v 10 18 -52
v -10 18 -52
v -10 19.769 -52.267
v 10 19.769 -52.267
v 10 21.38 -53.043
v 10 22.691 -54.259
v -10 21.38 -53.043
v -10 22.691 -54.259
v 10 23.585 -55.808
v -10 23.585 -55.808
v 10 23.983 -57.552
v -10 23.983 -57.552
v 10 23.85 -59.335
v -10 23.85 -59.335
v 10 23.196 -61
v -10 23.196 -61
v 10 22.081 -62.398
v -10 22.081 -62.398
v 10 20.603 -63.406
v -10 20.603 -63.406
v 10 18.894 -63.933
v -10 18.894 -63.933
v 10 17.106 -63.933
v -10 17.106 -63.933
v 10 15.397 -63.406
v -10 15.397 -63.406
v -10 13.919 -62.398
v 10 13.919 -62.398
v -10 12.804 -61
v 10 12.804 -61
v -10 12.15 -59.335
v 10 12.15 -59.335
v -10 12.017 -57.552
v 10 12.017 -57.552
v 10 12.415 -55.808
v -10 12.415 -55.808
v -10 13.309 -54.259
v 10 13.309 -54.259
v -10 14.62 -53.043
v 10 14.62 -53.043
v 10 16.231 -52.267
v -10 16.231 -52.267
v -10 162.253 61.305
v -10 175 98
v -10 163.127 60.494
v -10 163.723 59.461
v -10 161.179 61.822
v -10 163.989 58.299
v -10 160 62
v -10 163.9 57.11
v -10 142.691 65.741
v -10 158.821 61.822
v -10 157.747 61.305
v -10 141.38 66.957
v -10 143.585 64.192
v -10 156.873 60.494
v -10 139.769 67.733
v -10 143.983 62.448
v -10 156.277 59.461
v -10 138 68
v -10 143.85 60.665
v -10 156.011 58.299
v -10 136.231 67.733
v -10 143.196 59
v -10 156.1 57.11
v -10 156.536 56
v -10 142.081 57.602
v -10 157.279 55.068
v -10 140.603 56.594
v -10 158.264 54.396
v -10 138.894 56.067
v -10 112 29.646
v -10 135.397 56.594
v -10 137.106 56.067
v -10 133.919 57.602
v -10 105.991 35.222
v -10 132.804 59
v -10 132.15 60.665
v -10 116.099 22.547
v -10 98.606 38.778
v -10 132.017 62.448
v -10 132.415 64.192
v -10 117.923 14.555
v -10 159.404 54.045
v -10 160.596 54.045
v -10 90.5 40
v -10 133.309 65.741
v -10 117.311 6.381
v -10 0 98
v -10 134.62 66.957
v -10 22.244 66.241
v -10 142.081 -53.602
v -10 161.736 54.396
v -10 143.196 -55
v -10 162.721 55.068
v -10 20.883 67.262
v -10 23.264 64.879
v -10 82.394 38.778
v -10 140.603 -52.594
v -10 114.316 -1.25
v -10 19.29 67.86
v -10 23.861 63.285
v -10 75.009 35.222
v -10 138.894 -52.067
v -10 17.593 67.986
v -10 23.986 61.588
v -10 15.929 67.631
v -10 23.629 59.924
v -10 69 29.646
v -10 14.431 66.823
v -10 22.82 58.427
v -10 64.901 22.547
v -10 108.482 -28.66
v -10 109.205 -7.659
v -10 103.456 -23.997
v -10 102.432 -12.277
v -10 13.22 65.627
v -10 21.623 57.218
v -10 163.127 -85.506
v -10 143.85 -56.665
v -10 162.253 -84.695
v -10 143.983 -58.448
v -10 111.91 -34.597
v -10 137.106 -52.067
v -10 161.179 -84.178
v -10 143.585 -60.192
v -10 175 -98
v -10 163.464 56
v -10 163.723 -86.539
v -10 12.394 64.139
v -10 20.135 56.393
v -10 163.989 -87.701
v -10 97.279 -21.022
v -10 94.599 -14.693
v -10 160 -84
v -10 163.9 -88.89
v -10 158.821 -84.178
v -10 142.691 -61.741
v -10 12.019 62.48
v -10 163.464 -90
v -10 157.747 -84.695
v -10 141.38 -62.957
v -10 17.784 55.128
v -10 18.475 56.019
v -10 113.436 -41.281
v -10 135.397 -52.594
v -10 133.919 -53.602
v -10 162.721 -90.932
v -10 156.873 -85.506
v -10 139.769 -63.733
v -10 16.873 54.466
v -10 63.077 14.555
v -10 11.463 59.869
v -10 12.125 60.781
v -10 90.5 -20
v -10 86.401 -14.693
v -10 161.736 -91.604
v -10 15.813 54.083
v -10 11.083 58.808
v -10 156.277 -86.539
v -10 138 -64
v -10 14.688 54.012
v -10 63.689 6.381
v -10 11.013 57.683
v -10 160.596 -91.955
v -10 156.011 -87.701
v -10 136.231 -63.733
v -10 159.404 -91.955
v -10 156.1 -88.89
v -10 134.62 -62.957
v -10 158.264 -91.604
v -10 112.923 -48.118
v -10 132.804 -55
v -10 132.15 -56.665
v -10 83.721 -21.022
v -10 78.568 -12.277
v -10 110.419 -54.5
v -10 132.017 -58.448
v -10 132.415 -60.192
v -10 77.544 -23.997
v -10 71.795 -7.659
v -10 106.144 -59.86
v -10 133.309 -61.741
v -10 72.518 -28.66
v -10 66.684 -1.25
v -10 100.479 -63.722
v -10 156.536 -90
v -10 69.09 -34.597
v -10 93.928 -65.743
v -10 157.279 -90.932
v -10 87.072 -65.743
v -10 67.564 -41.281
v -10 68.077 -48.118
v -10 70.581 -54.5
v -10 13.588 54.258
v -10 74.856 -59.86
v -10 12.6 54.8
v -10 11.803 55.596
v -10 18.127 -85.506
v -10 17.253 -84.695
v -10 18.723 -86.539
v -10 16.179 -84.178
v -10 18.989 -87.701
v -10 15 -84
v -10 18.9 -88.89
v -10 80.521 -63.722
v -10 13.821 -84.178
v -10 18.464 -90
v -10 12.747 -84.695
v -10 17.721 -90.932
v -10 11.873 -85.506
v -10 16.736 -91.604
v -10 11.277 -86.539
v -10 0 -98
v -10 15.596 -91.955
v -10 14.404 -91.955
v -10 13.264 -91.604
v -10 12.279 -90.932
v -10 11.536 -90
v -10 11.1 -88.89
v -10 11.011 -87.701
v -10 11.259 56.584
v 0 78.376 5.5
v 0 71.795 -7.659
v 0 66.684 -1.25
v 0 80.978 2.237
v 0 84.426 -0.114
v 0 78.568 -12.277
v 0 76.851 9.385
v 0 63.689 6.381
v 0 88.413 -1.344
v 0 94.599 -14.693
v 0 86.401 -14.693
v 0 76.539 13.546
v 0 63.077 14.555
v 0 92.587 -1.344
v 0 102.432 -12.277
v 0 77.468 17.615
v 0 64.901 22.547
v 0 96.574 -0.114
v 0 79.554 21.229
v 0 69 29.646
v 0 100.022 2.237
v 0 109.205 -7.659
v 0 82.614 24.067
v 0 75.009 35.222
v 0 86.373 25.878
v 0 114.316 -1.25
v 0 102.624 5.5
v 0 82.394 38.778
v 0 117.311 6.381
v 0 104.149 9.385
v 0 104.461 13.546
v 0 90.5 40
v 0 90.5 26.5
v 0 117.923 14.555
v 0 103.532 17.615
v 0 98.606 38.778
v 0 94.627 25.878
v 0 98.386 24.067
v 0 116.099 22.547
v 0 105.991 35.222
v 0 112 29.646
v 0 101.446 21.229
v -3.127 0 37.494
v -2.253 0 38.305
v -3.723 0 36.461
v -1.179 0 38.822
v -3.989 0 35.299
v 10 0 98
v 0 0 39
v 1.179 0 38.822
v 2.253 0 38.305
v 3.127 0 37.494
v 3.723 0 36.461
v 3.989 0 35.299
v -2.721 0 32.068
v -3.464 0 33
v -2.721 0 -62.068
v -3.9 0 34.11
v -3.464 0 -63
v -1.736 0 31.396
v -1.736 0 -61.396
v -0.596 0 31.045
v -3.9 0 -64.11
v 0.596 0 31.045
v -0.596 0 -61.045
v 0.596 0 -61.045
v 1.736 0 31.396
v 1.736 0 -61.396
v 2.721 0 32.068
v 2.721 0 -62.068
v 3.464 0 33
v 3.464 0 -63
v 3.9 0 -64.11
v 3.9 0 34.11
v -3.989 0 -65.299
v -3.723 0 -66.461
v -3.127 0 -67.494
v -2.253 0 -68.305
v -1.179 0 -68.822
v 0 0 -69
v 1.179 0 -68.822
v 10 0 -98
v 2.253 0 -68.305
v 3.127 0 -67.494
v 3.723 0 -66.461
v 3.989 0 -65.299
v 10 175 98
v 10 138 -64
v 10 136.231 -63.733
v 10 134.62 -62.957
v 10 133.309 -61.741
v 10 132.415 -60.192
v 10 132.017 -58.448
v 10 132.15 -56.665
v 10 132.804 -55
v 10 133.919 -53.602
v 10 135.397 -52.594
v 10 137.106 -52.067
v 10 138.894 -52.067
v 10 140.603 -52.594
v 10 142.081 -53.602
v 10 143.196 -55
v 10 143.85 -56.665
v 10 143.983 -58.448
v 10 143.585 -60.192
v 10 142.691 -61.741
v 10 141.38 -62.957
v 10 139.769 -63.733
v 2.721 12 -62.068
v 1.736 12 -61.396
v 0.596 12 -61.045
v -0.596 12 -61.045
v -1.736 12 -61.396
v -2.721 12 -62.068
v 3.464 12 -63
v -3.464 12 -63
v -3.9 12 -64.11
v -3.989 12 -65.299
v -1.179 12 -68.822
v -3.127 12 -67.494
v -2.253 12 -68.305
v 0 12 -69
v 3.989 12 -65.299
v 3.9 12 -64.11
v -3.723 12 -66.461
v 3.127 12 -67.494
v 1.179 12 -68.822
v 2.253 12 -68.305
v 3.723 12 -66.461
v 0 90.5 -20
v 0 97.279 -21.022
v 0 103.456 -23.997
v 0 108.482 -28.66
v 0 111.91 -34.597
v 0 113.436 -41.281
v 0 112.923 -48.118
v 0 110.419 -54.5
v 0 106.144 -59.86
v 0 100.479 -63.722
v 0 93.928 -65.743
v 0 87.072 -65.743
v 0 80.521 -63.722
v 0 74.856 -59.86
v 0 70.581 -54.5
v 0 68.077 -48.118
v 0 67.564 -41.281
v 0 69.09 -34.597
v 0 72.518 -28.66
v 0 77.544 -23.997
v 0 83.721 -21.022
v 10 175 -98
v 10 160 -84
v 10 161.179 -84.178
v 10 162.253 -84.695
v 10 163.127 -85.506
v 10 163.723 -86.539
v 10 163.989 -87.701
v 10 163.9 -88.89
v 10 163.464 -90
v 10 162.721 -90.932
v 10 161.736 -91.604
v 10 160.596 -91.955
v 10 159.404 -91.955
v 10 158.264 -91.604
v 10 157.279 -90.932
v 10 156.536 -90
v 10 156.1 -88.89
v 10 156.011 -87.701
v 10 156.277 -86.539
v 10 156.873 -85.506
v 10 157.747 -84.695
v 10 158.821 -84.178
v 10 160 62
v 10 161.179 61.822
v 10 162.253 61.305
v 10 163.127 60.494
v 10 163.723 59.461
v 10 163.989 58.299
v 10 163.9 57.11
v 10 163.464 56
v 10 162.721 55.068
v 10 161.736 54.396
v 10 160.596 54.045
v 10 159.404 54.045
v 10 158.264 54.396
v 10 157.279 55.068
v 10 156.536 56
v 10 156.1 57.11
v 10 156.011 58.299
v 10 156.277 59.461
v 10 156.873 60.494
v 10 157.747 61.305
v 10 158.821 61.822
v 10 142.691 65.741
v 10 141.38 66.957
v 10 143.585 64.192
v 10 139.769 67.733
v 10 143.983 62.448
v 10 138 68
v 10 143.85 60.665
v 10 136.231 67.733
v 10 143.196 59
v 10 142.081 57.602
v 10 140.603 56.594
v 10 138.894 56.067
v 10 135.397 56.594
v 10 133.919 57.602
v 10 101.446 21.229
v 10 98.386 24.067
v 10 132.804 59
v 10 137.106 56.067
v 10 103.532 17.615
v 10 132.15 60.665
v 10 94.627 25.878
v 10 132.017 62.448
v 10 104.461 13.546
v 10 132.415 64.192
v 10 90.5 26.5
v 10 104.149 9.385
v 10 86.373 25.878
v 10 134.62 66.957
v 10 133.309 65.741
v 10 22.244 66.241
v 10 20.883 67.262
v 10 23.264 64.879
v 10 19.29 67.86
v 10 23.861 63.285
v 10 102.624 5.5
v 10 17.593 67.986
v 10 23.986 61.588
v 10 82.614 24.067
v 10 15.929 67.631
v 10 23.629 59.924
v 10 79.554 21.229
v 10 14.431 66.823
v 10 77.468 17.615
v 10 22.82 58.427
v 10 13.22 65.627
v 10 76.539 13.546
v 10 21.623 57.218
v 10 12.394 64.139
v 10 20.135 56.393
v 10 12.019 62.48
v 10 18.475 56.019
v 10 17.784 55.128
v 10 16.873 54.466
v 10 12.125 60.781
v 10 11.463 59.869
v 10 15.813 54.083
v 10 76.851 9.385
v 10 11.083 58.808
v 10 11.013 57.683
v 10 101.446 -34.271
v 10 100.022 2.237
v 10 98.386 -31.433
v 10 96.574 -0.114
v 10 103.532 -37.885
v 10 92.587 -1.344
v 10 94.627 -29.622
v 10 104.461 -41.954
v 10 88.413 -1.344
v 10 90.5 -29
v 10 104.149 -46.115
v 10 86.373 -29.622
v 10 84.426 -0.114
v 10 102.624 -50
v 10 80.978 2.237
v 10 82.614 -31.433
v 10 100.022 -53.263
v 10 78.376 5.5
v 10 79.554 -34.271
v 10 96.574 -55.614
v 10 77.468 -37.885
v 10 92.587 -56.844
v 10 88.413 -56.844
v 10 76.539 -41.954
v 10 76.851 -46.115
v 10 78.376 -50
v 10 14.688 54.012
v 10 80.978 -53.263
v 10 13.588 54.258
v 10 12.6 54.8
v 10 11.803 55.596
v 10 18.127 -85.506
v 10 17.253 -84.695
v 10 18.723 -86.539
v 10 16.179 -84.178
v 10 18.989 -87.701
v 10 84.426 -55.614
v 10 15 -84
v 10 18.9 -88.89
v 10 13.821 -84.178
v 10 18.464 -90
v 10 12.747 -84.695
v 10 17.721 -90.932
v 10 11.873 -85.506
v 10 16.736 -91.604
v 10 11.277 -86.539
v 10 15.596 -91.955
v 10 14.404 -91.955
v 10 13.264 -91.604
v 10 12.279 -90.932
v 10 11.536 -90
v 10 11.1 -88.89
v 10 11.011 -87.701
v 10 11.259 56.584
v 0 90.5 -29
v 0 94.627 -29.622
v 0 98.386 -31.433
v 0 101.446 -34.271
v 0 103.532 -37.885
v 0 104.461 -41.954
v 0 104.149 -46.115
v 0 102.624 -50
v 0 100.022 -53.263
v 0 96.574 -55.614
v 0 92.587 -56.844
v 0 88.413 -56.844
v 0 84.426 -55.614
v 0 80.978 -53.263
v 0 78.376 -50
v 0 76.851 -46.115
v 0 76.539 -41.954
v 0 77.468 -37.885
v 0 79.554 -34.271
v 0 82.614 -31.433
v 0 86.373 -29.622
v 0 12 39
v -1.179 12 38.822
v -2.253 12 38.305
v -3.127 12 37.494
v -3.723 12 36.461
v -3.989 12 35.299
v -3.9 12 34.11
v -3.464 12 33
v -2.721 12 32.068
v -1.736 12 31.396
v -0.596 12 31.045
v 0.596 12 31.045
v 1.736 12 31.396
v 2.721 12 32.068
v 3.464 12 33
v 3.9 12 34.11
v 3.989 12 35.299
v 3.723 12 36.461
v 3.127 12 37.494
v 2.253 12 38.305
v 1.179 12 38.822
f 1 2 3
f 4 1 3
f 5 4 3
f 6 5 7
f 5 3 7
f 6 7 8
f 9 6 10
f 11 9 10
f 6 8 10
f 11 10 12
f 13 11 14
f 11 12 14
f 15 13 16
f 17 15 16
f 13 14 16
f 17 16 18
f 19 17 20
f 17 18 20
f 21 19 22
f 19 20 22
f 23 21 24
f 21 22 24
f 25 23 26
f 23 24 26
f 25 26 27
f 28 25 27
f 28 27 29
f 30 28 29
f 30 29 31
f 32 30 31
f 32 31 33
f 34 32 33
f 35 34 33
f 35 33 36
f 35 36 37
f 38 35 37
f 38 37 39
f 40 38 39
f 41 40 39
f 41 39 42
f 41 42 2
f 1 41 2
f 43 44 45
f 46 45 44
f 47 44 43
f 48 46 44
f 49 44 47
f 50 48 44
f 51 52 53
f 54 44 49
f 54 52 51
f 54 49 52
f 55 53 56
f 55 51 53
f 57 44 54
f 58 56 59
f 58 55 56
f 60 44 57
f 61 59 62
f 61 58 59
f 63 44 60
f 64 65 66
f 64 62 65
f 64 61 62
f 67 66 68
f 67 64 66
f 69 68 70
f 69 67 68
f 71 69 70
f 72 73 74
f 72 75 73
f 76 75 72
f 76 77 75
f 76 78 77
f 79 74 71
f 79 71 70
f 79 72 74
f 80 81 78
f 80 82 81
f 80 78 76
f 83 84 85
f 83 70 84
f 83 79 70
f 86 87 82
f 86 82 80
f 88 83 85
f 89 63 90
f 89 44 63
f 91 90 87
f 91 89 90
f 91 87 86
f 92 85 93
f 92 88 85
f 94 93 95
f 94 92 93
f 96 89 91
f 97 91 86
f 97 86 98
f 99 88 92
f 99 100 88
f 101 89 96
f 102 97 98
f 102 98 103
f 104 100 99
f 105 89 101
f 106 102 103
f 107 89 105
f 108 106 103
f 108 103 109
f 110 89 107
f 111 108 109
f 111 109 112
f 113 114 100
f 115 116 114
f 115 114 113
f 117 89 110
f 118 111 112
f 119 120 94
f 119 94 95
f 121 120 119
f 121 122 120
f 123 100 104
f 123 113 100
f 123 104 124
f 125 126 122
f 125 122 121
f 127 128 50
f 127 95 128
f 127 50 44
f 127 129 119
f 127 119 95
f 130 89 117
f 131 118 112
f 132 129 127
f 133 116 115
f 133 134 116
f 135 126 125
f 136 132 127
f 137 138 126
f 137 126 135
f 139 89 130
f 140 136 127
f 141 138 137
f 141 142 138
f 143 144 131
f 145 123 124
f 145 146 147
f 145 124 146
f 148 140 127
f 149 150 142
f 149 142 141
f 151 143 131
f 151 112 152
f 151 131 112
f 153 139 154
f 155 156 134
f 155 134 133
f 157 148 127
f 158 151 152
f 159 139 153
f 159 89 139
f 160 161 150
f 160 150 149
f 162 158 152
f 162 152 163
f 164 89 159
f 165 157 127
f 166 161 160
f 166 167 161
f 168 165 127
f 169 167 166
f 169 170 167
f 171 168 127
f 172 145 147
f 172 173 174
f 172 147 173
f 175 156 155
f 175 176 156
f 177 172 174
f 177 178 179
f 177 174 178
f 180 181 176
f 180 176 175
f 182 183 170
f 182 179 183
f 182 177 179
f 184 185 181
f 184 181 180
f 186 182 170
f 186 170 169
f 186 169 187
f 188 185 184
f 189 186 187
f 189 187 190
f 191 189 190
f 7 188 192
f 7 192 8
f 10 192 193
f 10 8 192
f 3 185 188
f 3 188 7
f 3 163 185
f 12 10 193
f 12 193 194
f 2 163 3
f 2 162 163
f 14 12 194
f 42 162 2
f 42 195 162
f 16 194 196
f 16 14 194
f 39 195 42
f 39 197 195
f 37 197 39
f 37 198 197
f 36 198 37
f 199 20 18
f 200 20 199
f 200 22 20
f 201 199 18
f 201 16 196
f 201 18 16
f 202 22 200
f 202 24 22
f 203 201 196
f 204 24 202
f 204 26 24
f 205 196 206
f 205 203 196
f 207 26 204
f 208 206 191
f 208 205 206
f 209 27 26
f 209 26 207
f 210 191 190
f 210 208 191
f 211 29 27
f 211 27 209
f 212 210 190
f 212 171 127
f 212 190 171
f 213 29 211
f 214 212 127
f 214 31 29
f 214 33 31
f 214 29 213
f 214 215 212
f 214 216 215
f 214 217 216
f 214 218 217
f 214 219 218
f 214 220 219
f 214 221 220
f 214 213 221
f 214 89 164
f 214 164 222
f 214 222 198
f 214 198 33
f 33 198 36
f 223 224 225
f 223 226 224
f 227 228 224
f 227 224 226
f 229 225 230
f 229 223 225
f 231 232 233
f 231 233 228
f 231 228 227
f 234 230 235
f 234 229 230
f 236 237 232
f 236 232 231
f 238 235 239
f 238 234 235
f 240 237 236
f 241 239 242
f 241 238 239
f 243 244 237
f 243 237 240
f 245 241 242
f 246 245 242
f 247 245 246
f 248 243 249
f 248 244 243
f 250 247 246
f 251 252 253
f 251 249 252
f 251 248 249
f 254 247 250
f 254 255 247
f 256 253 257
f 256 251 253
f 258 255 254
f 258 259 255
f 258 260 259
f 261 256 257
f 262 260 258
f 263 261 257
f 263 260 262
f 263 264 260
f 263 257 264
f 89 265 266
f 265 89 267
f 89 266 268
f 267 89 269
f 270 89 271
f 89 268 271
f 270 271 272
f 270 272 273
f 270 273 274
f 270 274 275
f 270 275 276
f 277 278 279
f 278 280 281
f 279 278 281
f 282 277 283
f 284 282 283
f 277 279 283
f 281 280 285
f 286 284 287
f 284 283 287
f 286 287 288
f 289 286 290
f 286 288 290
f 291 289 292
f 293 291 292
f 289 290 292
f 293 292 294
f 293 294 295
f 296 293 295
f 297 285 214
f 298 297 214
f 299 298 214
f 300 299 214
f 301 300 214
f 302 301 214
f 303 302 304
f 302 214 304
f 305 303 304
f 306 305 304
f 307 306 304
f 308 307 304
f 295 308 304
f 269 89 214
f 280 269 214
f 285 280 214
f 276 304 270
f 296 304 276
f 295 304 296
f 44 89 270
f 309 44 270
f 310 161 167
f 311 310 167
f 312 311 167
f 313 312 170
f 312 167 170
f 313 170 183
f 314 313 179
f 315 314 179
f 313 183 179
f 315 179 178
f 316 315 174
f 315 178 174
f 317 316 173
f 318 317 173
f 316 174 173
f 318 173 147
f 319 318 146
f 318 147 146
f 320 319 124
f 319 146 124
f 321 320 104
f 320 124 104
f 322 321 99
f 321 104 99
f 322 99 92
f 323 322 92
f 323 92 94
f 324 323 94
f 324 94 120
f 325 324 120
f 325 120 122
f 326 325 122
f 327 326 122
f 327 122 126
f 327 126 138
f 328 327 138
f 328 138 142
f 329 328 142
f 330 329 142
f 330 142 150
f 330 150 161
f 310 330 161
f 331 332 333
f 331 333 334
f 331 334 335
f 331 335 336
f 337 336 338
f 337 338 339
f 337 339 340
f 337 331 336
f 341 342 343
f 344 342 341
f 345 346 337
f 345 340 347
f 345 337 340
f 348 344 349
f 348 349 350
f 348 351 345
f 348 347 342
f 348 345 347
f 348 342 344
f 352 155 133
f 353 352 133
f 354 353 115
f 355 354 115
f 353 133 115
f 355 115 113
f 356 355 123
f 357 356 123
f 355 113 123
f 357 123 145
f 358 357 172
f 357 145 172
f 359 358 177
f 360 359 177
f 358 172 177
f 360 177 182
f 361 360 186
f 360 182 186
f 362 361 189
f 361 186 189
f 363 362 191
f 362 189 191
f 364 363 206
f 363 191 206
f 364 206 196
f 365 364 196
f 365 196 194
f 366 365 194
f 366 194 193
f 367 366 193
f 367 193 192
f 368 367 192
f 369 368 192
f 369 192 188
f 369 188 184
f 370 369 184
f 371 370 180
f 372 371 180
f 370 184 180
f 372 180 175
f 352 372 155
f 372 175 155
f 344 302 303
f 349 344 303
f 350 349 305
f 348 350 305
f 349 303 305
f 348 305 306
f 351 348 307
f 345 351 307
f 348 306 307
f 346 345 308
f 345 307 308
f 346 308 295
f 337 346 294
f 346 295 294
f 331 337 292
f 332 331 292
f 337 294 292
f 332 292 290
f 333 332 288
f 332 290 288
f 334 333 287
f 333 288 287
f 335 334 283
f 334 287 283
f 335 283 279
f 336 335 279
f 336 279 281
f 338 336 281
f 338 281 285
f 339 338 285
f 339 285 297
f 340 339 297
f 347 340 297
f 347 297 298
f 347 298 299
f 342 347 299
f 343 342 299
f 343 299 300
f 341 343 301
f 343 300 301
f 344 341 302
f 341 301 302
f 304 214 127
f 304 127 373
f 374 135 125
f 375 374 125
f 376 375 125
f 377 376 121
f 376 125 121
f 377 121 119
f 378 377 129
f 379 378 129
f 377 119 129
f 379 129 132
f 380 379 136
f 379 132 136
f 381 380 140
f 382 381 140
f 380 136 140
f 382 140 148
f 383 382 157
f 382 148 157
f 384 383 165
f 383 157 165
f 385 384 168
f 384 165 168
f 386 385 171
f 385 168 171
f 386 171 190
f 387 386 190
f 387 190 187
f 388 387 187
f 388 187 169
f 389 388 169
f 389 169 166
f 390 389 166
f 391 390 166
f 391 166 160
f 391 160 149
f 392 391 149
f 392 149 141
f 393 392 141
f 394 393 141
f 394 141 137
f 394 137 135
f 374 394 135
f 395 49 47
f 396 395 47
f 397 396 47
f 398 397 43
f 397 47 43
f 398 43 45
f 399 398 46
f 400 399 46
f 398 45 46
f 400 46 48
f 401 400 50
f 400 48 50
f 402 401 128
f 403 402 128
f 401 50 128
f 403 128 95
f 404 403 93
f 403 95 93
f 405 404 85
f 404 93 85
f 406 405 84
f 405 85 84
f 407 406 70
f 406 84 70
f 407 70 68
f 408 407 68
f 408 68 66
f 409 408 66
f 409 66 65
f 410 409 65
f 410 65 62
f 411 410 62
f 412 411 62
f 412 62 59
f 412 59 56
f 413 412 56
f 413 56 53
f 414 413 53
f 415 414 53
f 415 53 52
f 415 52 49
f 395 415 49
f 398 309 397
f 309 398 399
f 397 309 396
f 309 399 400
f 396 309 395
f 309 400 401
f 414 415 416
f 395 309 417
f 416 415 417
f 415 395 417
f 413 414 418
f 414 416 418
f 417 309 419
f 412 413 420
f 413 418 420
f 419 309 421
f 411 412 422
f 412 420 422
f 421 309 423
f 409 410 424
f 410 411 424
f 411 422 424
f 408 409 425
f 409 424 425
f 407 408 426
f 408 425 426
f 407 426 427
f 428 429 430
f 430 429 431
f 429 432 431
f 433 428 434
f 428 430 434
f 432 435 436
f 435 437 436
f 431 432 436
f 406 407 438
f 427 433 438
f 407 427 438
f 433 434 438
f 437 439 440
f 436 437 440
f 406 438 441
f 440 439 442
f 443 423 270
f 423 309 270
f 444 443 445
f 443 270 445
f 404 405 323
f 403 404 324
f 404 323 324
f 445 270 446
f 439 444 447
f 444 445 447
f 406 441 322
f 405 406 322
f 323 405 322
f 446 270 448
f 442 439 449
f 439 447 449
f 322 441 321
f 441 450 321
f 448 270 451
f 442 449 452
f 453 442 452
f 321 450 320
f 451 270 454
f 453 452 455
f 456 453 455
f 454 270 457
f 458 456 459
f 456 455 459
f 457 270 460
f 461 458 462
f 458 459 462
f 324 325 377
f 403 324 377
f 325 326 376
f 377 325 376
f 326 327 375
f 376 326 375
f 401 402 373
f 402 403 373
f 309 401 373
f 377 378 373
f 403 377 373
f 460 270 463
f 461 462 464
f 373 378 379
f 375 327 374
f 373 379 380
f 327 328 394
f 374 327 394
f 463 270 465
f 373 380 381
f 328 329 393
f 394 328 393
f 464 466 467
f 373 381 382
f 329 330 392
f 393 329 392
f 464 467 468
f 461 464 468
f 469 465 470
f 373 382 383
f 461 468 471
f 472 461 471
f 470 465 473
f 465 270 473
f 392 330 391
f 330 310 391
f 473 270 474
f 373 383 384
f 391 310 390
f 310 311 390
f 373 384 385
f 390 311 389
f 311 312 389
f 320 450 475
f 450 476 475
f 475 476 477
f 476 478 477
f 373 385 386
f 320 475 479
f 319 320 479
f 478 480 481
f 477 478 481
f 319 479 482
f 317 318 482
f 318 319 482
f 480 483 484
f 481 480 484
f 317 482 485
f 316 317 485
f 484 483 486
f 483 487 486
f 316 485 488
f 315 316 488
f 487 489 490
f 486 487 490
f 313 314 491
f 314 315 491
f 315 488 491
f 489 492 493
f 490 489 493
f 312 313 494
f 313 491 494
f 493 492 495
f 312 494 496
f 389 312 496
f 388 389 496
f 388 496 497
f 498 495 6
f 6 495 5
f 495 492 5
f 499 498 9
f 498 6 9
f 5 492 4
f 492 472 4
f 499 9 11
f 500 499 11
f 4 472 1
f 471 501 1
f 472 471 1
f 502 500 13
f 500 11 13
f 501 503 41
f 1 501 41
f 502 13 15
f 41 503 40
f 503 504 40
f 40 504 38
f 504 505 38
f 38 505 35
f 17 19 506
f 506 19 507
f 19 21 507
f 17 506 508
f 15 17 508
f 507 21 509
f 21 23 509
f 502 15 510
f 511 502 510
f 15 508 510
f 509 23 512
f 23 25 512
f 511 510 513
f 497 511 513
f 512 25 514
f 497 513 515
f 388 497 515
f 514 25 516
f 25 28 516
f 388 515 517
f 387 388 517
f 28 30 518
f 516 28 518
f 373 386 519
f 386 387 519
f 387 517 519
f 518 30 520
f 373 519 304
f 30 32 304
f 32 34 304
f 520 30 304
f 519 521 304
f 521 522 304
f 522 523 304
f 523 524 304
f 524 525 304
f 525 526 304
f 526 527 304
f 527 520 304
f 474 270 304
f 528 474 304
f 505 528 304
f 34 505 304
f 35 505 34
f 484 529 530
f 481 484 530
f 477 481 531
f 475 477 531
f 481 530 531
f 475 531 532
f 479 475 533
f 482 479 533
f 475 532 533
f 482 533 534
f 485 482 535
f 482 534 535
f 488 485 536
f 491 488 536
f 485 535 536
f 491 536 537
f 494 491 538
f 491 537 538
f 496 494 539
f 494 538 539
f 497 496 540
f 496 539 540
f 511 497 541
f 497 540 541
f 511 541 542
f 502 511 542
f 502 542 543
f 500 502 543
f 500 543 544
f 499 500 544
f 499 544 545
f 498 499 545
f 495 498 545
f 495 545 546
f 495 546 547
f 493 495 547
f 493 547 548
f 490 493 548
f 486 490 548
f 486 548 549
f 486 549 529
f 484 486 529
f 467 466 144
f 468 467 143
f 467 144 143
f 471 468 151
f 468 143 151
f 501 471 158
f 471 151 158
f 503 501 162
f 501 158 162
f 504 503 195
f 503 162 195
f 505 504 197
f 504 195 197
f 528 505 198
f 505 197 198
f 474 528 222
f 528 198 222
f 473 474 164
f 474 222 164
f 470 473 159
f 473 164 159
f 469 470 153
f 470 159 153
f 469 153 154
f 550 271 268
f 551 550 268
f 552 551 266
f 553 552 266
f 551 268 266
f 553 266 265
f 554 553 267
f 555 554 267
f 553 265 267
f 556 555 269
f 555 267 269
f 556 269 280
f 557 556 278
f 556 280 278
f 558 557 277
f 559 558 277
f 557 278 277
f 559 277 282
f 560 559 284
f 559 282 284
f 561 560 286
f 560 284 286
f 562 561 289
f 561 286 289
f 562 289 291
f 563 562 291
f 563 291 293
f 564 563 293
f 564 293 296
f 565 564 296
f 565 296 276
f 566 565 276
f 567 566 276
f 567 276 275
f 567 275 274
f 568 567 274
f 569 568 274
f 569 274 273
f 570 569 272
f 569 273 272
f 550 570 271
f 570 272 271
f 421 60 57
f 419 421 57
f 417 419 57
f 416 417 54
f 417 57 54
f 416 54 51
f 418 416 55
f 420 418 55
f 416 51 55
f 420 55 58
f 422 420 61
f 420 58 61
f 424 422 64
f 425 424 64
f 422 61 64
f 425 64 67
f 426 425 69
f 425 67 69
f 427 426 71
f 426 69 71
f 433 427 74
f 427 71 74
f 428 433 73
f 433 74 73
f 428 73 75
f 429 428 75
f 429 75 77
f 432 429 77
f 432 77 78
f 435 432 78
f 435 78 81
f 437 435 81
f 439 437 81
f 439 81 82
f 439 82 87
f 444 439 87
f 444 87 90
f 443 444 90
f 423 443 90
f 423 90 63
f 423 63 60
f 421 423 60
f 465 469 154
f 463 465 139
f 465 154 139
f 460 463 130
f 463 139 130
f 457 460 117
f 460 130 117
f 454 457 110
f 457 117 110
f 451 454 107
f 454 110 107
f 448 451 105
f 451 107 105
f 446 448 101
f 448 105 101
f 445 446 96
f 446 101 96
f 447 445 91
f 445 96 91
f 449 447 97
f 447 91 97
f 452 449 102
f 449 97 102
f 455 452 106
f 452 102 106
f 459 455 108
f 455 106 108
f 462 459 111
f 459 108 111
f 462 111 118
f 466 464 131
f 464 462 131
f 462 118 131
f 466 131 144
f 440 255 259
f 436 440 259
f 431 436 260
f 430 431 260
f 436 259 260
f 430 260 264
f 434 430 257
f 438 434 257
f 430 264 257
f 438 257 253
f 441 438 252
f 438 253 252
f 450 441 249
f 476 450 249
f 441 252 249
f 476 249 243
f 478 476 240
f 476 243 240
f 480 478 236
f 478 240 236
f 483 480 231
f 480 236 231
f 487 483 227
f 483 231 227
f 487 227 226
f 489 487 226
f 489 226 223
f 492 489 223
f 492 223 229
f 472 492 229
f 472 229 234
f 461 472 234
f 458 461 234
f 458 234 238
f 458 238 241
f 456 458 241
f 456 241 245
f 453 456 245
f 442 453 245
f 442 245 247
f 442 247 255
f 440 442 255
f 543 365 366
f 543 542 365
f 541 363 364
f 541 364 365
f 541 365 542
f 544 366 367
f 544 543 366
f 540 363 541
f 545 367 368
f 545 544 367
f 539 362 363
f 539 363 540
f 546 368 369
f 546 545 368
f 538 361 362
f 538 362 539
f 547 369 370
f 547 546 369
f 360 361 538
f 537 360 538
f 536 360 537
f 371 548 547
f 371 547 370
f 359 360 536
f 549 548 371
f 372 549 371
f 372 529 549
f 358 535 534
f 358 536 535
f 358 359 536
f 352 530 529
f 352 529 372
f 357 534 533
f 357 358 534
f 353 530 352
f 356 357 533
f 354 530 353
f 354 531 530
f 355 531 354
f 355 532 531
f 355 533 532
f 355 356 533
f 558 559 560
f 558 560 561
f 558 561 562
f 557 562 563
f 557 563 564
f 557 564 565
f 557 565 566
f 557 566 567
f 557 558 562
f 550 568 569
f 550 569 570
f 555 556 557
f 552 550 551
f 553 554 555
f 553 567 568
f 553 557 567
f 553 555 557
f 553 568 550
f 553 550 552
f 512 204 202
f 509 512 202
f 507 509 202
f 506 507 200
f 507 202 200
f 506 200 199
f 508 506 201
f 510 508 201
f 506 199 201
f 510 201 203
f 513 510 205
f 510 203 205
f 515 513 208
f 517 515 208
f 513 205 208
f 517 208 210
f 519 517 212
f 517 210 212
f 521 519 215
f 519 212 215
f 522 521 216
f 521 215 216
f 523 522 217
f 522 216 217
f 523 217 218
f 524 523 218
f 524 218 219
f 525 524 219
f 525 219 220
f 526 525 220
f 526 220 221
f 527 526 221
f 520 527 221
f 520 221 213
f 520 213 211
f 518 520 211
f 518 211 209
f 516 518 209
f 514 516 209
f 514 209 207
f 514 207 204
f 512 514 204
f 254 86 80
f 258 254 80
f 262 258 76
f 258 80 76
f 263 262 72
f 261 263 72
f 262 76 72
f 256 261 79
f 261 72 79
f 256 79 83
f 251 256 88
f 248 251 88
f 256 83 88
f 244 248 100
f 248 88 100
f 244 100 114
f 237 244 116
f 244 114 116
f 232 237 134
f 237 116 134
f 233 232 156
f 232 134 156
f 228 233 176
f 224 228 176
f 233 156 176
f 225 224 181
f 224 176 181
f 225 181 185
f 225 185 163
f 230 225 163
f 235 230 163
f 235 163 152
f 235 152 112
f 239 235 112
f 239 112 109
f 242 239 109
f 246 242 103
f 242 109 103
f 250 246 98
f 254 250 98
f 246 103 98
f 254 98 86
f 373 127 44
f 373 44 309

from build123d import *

# Parameters (mm, degrees)
SKETCH1_W           = 20
SKETCH1_H           = 196
BOSS_EXTRUDE1_DEPTH = 175
SKETCH2_R           = 27.5
SKETCH2_R_2         = 23
CUT_EXTRUDE1_DEPTH  = 10
SKETCH3_R           = 14
CUT_EXTRUDE2_DEPTH  = 201.820815654
SKETCH4_R           = 4
CUT_EXTRUDE3_DEPTH  = 202.566366242
SKETCH5_R           = 6
CUT_EXTRUDE4_DEPTH  = 202.566366242
SKETCH6_R           = 4
CUT_EXTRUDE6_DEPTH  = 12


with BuildPart() as part:
    # Sketch1 → Boss-Extrude1 (new body)
    with BuildSketch(Plane(origin=(114, 0, 0), x_dir=(1, 0, 0), z_dir=(0, 1, 0))):
        with Locations((-114, 0)):
            Rectangle(SKETCH1_W, SKETCH1_H)
    extrude(amount=BOSS_EXTRUDE1_DEPTH)

    # Sketch2 → Cut-Extrude1 (cut)
    with BuildSketch(Plane.ZY.offset(10)):
        with Locations((12.5, 90.5)):
            Circle(SKETCH2_R)
        with Locations((-43, 90.5)):
            Circle(SKETCH2_R_2)
    extrude(amount=-CUT_EXTRUDE1_DEPTH, mode=Mode.SUBTRACT)

    # Sketch3 → Cut-Extrude2 (cut, through all)
    with BuildSketch(Plane.ZY):
        with Locations((12.5, 90.5)):
            Circle(SKETCH3_R)
        with Locations((-43, 90.5)):
            Circle(SKETCH3_R)
    extrude(amount=-CUT_EXTRUDE2_DEPTH, mode=Mode.SUBTRACT)

    # Sketch4 → Cut-Extrude3 (cut, through all)
    with BuildSketch(Plane.ZY.offset(10)):
        with Locations((58, 15)):
            Circle(SKETCH4_R)
        with Locations((-88, 15)):
            Circle(SKETCH4_R)
        with Locations((-88, 160)):
            Circle(SKETCH4_R)
        with Locations((58, 160)):
            Circle(SKETCH4_R)
    extrude(amount=-CUT_EXTRUDE3_DEPTH, mode=Mode.SUBTRACT)

    # Sketch5 → Cut-Extrude4 (cut, through all)
    with BuildSketch(Plane.ZY.offset(10)):
        with Locations((62, 138)):
            Circle(SKETCH5_R)
        with Locations((62, 18)):
            Circle(SKETCH5_R)
        with Locations(Location((-58, 138, 0), (0, 0, 180))):
            Circle(SKETCH5_R)
        with Locations((-58, 18)):
            Circle(SKETCH5_R)
    extrude(amount=-CUT_EXTRUDE4_DEPTH, mode=Mode.SUBTRACT)

    # Sketch6 → Cut-Extrude6 (cut)
    with BuildSketch(Plane.XZ):
        with Locations(Location((0, -65, 0), (0, 0, 270))):
            Circle(SKETCH6_R)
        with Locations(Location((0, 35, 0), (0, 0, 90))):
            Circle(SKETCH6_R)
    extrude(amount=-CUT_EXTRUDE6_DEPTH, mode=Mode.SUBTRACT)


solid = part.part
